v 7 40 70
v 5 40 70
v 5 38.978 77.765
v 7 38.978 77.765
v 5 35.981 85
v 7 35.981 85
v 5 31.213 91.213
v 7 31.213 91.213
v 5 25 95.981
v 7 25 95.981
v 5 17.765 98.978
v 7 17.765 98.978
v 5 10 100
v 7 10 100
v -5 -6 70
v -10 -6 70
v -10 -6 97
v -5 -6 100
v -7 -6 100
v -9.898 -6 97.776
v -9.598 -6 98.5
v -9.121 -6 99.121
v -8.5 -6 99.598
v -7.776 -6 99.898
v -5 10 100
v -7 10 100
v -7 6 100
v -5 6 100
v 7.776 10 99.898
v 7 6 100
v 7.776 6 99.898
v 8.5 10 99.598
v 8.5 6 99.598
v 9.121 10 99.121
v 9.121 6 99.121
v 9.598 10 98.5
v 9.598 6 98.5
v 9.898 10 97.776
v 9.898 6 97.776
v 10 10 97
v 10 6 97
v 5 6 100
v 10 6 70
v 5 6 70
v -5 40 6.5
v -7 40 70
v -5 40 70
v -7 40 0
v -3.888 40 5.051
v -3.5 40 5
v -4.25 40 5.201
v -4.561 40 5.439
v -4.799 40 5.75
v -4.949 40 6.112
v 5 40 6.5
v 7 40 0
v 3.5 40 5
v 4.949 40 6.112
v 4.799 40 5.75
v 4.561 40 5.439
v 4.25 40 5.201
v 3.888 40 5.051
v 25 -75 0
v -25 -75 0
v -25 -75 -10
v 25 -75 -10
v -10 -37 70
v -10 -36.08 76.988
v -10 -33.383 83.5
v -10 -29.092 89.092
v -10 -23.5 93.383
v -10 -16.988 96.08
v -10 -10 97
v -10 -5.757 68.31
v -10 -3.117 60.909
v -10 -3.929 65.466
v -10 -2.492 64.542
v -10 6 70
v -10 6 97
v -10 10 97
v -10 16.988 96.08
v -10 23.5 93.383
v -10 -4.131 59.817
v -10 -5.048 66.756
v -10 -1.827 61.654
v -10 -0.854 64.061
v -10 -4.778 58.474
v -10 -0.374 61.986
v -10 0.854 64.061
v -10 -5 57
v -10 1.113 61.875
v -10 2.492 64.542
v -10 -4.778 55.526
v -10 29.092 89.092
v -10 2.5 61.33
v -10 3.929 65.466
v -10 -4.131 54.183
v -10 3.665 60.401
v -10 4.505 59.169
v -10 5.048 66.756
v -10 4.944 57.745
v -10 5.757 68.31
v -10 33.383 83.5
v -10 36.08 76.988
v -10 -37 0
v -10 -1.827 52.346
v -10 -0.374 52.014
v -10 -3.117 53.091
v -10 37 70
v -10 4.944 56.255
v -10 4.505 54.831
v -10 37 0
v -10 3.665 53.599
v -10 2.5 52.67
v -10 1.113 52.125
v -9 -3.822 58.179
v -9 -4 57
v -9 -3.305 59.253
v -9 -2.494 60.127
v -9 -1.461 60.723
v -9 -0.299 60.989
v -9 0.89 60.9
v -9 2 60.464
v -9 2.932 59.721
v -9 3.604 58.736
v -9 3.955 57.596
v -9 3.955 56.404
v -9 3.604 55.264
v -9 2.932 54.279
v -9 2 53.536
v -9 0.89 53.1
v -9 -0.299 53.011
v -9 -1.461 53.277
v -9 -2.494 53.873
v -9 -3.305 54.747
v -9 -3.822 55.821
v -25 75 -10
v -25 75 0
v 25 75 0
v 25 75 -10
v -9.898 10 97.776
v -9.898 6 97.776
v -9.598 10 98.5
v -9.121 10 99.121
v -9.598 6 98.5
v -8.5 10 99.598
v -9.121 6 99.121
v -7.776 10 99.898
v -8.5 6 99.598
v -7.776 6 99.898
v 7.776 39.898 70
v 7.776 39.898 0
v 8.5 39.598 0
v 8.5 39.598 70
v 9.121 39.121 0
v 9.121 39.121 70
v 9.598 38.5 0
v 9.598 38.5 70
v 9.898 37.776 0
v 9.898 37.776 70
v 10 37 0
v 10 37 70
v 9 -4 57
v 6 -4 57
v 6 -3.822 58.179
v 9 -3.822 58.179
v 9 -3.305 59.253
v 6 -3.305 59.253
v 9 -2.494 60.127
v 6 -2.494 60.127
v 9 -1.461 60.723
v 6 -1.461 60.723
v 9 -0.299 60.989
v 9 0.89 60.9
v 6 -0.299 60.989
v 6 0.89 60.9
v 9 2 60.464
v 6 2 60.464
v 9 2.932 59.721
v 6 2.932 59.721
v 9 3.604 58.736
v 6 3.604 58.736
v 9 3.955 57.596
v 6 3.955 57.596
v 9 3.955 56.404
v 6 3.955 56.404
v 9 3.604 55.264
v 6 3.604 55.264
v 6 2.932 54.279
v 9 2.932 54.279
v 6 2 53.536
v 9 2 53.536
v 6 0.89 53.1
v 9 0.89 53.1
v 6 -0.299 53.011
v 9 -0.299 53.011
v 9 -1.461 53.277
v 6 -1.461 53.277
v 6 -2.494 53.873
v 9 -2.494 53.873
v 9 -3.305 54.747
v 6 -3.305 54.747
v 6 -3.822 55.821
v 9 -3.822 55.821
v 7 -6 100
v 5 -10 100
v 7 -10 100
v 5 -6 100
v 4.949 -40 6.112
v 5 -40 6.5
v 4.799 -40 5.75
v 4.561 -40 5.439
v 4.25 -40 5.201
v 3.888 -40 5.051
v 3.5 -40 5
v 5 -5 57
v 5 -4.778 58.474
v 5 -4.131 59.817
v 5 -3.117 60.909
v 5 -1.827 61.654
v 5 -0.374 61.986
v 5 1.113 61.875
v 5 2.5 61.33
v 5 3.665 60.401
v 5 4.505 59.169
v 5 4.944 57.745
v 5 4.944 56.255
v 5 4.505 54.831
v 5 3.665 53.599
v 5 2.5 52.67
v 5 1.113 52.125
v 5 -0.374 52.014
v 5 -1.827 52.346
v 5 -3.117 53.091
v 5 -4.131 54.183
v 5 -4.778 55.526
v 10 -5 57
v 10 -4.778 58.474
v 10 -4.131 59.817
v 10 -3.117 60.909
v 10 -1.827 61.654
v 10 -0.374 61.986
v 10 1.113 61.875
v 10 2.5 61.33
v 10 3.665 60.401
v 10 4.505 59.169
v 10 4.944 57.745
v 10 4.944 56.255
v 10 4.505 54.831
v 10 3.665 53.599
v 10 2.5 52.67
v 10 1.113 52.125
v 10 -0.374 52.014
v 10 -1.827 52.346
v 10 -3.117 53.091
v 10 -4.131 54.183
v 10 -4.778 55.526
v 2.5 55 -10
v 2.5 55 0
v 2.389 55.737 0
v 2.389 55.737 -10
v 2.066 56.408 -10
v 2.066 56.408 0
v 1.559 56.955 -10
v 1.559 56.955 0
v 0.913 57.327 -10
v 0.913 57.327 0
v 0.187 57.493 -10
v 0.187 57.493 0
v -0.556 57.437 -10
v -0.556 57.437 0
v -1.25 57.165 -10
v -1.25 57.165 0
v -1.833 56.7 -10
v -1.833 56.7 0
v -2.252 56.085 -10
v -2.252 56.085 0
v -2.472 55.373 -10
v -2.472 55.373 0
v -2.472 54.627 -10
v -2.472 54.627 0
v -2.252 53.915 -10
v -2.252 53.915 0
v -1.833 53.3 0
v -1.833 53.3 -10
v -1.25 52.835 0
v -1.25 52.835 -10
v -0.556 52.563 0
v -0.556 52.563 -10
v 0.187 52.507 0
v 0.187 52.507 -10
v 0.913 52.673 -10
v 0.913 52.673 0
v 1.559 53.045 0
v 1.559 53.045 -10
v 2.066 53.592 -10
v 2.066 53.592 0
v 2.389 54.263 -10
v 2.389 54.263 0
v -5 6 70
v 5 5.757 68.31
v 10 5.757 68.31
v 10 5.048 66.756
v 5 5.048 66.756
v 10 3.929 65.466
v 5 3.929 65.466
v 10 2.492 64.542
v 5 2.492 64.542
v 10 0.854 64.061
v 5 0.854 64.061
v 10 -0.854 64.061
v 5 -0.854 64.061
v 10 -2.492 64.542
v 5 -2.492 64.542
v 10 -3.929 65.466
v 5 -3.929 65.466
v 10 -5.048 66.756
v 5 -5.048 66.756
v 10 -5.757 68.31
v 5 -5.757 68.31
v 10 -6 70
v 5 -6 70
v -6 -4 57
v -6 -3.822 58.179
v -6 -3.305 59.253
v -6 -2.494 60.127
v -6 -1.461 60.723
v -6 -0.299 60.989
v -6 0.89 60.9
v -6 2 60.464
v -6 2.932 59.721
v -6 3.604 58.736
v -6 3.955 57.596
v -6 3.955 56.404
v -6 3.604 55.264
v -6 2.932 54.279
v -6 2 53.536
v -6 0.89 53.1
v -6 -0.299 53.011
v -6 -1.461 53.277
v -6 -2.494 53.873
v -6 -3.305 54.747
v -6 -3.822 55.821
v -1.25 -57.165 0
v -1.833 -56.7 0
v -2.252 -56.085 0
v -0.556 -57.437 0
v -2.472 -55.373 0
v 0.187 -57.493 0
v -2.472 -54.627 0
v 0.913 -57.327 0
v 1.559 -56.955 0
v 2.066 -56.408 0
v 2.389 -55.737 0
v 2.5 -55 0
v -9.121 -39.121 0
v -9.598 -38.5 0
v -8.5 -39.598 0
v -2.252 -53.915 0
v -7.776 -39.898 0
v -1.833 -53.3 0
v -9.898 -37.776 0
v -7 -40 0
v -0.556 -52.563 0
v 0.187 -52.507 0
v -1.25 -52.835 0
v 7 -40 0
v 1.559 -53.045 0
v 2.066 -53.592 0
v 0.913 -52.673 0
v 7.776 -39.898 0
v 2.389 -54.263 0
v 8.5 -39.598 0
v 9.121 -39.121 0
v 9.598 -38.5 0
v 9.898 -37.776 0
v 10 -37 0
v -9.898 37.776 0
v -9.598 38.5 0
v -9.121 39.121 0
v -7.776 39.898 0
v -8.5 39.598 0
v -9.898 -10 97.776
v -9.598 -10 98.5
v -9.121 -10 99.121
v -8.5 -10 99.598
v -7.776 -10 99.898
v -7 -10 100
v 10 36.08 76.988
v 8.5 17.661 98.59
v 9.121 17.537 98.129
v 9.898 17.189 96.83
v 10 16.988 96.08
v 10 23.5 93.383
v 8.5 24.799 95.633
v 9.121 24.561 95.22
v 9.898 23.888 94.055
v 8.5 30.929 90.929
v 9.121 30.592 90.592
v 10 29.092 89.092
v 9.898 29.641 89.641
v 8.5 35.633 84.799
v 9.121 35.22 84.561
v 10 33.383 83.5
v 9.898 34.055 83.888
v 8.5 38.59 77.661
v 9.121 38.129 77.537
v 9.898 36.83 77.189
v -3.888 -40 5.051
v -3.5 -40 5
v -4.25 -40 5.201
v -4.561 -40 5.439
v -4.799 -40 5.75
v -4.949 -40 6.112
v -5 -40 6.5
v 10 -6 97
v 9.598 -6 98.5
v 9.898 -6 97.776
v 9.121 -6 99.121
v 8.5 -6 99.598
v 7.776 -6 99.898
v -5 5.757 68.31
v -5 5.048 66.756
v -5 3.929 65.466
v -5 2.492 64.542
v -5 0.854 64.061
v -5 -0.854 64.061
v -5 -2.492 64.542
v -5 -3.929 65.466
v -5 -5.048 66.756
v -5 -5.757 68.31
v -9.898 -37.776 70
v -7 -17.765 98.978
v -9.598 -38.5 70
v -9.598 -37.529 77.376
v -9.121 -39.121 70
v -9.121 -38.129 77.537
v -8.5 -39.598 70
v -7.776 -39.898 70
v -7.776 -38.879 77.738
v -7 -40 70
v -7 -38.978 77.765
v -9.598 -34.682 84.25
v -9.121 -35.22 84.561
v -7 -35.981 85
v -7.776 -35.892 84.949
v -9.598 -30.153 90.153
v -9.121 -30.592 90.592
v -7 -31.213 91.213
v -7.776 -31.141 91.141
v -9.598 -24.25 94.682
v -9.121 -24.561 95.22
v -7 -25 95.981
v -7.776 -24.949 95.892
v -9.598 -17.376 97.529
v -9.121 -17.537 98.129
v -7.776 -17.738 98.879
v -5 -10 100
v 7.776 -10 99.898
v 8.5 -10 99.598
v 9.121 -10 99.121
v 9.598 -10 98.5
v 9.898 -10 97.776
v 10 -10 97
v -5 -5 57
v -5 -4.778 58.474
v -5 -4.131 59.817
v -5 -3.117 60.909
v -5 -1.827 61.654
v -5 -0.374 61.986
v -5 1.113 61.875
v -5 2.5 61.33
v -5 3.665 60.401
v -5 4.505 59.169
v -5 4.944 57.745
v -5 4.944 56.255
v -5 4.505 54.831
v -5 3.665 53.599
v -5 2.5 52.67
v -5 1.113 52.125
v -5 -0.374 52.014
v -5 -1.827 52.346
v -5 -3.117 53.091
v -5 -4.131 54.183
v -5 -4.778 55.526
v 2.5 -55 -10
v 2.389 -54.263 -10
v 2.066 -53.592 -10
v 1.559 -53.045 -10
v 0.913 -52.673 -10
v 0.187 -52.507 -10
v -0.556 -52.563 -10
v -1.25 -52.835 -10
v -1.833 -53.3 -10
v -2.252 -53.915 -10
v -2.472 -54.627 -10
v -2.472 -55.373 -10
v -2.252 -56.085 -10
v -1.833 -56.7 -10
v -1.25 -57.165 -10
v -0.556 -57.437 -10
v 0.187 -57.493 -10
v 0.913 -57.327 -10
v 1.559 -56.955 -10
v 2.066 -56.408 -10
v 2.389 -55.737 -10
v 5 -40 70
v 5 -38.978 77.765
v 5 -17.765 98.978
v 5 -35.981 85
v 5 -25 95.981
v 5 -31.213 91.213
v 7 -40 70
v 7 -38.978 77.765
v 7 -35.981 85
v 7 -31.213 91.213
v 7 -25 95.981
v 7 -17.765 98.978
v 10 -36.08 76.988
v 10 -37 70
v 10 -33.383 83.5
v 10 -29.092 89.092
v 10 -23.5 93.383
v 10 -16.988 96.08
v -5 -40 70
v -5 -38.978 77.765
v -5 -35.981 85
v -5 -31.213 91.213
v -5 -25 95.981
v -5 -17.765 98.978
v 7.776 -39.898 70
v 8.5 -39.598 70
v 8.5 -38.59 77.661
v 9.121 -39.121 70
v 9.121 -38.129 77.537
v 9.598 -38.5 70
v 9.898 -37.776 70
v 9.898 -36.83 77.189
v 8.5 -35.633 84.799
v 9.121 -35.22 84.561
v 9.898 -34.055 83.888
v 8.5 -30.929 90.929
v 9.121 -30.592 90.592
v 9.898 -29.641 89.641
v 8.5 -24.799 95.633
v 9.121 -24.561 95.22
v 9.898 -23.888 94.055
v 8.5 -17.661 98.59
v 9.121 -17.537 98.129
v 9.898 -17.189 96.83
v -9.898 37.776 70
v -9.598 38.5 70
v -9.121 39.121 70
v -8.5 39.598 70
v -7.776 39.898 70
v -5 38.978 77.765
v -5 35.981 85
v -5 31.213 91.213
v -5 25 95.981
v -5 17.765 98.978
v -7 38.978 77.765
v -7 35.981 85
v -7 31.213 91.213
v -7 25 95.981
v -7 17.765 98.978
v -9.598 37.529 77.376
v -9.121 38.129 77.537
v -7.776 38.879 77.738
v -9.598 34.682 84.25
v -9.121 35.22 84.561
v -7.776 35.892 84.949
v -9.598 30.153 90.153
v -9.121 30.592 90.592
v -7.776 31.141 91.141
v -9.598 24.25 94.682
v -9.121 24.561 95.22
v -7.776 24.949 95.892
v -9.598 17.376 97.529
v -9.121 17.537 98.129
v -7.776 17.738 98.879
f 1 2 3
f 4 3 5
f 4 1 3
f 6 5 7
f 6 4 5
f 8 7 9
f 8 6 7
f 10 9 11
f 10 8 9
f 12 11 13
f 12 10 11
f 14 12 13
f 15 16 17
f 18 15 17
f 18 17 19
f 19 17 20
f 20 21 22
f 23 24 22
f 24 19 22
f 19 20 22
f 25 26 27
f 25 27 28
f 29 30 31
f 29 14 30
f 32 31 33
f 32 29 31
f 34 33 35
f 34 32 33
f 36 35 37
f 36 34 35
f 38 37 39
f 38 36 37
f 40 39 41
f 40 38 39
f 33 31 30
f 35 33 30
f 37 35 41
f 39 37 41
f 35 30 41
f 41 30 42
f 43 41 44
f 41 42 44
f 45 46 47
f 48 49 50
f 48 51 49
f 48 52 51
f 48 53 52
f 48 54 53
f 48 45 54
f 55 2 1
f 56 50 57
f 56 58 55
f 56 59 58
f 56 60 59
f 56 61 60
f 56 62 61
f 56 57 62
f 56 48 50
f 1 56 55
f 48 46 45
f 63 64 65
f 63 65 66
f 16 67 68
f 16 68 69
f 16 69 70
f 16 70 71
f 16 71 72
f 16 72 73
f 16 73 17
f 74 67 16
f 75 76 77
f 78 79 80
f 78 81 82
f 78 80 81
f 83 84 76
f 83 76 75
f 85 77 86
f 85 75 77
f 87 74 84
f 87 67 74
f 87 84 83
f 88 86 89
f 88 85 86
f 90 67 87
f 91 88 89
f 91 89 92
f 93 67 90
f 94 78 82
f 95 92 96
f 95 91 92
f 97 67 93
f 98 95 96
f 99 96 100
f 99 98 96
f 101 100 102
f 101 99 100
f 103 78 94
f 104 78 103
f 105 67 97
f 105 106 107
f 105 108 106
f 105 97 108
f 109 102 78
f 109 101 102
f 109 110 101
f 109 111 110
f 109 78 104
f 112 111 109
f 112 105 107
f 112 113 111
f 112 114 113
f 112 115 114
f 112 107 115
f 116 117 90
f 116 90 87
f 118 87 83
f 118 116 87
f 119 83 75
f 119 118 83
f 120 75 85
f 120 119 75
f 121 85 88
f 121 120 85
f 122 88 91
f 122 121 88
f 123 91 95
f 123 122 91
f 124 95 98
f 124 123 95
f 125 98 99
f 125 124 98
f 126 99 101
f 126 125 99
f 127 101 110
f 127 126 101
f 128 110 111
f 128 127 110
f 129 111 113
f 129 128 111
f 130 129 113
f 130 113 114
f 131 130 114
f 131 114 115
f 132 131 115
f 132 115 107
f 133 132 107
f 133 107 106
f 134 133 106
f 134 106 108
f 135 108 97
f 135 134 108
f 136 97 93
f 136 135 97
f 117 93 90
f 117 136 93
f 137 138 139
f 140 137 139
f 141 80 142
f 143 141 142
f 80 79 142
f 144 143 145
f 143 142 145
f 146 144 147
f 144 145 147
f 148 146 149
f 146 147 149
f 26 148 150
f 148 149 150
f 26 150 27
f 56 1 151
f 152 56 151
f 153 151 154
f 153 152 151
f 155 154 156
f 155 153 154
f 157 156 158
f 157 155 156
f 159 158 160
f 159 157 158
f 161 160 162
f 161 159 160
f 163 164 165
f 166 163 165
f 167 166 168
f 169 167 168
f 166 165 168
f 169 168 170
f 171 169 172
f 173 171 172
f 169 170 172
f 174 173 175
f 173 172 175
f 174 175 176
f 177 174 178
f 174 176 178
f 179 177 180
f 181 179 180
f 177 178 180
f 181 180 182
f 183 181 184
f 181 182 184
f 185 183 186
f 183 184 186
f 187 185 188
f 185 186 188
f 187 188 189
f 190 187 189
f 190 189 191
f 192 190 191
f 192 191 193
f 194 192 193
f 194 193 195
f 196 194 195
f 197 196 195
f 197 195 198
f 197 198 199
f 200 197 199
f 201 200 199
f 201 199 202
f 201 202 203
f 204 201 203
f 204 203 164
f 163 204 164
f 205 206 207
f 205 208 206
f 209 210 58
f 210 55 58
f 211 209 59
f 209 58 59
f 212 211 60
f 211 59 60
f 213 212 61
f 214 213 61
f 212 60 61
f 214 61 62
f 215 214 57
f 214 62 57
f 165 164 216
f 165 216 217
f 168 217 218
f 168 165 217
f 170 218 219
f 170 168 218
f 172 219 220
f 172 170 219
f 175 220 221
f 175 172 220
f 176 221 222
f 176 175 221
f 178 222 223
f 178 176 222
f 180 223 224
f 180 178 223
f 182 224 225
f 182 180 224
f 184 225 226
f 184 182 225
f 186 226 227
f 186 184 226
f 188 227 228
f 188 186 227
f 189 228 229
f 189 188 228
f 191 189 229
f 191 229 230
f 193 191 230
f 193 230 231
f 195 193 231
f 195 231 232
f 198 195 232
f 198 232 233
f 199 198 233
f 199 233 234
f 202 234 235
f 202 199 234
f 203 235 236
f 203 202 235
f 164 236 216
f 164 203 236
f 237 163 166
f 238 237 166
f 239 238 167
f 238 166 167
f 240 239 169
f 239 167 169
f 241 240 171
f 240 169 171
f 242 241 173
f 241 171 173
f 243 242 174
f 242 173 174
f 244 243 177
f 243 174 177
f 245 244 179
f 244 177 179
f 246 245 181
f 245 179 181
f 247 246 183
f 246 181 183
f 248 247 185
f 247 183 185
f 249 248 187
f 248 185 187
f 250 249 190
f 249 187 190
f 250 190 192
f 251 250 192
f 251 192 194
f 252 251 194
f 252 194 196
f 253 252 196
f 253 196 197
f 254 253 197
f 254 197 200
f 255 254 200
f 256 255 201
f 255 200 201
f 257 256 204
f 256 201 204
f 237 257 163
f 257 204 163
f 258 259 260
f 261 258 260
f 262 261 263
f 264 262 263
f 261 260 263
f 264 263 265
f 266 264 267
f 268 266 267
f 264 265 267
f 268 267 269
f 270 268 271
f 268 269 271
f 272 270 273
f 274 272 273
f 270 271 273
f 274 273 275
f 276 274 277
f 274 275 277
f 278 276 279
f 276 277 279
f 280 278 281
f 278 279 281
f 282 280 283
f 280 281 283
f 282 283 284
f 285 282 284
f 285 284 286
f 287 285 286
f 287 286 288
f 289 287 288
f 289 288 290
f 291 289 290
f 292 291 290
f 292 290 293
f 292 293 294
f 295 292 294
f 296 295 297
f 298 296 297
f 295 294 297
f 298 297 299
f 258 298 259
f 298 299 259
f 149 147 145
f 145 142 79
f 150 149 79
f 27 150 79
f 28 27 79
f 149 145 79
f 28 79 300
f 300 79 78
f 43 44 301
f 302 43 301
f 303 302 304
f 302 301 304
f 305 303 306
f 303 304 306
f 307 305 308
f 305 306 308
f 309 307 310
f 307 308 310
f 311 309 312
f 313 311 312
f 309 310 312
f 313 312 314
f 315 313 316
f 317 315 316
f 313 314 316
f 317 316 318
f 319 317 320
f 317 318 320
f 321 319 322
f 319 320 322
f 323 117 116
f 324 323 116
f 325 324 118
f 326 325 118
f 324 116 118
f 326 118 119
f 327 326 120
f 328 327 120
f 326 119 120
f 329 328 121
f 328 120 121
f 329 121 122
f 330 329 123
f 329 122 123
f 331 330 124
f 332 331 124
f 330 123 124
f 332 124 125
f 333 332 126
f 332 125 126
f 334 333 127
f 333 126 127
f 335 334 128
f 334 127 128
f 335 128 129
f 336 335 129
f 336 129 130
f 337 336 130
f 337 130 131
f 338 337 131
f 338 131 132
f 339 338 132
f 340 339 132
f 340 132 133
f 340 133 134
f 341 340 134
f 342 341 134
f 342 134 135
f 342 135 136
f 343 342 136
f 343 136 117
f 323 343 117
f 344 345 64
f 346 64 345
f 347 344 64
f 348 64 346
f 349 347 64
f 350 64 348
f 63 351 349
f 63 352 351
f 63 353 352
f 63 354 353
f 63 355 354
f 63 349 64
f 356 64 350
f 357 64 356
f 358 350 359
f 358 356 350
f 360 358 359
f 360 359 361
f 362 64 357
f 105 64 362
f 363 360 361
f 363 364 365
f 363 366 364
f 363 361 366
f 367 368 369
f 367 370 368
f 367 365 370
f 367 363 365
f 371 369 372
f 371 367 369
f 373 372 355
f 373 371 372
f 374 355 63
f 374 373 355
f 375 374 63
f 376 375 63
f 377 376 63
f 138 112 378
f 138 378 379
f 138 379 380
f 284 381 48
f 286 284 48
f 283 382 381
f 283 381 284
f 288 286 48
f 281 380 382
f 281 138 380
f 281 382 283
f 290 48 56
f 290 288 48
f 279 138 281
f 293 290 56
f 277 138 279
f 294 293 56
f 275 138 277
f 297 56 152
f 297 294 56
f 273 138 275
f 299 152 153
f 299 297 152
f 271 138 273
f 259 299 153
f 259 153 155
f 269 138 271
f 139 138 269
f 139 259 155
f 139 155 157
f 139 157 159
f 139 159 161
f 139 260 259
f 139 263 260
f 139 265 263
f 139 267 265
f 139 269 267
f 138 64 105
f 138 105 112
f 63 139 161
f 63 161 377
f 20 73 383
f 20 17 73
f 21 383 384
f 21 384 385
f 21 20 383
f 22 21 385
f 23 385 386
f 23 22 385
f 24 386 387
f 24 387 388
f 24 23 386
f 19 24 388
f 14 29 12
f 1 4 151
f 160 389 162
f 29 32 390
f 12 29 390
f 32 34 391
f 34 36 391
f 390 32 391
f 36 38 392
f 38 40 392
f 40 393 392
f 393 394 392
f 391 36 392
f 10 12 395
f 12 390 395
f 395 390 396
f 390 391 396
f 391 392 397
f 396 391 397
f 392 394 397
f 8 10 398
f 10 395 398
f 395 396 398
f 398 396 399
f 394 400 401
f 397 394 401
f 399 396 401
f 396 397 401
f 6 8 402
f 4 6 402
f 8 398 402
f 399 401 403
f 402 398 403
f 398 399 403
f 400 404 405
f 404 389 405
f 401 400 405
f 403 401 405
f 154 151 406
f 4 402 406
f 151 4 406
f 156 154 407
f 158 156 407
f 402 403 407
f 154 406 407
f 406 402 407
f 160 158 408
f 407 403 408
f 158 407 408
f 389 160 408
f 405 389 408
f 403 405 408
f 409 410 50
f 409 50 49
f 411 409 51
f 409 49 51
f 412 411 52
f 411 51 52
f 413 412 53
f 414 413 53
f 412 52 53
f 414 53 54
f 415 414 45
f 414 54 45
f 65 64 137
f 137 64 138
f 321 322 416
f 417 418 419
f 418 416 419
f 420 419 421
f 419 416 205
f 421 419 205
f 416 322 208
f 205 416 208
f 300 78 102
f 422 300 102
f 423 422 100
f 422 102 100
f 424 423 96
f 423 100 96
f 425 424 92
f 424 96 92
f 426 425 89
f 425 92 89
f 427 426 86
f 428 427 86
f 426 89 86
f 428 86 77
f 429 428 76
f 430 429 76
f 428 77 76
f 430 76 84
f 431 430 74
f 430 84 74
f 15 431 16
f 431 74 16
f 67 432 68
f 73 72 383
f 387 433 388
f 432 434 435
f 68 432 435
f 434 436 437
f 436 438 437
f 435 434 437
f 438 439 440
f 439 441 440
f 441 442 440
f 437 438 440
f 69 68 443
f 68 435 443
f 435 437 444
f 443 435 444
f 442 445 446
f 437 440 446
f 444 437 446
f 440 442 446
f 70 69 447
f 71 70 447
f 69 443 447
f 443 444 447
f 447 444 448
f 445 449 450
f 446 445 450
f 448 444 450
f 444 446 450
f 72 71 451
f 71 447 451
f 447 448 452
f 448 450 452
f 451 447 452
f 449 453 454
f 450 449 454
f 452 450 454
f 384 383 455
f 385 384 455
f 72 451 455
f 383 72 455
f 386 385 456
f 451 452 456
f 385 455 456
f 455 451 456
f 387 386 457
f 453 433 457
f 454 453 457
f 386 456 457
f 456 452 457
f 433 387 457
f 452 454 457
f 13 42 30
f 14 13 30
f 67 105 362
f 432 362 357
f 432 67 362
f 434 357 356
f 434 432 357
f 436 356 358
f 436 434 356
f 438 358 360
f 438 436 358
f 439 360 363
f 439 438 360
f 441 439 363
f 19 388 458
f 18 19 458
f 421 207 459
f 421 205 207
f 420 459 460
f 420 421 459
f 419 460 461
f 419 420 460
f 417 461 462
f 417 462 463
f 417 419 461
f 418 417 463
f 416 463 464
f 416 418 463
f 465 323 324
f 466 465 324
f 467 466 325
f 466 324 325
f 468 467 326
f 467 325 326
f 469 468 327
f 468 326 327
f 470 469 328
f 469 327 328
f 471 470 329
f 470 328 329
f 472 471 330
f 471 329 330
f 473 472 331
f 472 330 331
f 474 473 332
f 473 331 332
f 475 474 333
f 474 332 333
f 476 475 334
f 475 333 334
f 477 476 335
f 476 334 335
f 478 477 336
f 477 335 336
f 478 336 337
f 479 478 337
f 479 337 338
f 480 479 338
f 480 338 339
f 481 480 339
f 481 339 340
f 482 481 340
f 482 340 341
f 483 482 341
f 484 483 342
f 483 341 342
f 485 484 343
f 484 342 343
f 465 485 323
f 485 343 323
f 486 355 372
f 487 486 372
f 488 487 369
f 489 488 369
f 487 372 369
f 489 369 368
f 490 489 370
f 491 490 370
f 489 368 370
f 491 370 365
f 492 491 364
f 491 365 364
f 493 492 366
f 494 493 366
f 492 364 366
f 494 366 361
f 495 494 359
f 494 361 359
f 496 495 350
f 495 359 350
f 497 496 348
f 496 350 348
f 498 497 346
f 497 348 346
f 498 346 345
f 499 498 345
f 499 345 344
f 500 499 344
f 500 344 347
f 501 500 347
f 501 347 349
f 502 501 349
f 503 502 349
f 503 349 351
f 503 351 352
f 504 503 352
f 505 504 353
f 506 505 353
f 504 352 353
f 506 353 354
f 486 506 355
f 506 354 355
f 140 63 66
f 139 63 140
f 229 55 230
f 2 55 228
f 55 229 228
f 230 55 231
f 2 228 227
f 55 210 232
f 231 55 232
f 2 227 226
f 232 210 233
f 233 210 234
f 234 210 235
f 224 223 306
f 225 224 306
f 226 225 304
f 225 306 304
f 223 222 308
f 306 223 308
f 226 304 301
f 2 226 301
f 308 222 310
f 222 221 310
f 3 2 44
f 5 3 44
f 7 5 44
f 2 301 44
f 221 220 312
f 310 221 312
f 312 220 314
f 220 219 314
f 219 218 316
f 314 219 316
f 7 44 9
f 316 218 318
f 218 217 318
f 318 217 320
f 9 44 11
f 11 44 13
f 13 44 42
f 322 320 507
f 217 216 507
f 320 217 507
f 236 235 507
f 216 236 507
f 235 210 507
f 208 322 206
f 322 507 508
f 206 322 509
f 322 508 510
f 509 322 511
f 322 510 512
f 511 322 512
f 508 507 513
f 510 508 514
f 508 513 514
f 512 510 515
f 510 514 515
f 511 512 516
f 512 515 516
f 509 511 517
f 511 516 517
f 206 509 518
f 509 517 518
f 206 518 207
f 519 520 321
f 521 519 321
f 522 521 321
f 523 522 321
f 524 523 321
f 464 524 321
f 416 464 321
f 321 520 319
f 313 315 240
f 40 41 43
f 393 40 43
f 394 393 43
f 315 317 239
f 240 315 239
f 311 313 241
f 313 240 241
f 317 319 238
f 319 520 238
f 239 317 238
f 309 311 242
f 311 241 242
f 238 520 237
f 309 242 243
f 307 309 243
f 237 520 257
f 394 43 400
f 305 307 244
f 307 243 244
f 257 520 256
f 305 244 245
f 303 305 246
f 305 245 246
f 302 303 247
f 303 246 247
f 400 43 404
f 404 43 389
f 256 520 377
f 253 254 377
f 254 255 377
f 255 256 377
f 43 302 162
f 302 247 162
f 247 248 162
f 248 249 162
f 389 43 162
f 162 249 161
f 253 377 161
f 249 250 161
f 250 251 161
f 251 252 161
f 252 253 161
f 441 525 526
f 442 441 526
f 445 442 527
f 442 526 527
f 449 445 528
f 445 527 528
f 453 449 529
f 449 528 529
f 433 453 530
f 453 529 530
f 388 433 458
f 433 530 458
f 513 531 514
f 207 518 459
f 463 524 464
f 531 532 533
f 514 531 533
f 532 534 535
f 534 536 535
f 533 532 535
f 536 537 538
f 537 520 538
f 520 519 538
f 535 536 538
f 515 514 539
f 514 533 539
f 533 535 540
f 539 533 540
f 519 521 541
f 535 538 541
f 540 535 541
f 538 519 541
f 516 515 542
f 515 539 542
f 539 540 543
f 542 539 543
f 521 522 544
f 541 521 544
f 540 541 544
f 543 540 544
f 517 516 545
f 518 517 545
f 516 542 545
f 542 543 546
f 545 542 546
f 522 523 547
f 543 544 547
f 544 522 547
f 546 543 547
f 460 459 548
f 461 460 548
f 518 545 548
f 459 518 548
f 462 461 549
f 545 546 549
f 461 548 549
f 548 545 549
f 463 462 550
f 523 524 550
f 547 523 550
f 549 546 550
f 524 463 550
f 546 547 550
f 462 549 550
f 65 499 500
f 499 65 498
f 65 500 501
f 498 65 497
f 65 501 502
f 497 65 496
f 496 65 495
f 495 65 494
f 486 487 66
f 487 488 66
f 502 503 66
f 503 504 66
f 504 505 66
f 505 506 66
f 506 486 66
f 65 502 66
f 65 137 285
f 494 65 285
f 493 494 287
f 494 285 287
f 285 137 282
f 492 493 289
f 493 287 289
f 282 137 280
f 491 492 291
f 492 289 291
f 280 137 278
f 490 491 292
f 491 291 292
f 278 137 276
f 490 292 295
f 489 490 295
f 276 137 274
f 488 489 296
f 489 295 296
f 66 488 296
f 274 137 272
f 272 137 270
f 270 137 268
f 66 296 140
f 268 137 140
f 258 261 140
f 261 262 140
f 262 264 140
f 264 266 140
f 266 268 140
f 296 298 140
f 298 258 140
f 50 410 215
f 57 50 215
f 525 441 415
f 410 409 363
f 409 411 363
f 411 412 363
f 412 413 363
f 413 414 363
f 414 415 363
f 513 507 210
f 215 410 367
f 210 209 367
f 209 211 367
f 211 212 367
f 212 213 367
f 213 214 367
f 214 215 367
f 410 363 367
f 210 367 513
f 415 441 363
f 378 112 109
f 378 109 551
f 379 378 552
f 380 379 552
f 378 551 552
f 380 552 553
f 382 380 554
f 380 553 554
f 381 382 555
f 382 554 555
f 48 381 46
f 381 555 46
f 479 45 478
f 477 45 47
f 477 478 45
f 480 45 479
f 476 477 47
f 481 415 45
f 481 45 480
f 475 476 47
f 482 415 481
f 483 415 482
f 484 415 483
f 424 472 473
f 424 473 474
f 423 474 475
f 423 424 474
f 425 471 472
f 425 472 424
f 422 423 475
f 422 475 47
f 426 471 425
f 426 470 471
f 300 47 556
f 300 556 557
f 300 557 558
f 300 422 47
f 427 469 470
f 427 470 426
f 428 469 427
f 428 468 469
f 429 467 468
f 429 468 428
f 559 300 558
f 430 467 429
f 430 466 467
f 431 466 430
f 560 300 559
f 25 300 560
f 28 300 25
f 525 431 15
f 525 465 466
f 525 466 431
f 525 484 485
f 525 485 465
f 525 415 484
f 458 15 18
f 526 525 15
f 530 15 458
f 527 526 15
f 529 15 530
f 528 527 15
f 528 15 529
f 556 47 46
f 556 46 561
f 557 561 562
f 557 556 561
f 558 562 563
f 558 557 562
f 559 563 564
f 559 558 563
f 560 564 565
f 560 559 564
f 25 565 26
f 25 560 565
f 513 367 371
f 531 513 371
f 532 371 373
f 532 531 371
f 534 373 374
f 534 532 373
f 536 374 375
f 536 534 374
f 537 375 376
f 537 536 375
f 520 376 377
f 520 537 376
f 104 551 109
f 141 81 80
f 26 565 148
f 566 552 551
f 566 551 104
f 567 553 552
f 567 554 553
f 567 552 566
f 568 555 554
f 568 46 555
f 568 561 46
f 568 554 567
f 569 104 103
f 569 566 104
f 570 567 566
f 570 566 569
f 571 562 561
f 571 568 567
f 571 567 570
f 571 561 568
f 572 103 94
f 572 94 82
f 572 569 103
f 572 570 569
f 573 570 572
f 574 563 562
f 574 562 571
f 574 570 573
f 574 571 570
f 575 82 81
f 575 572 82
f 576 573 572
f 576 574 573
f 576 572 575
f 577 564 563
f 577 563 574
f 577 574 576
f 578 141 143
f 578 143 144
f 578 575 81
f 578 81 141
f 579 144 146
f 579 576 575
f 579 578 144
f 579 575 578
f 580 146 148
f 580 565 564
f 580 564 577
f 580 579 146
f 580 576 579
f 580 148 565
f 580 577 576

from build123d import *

# Parameters (mm, degrees)
F0_W     = 50
F0_H     = 150
F0_R     = 2.5
F0_W_2   = 20
F0_H_2   = 80
F1_DEPTH = 10
F2_DEPTH = 100
F4_DEPTH = 20
F5_W     = 10
F5_H     = 95
F6_DEPTH = 115.001
F7_R     = 1.5
F8_R     = 4
F9_DEPTH = 35.001
F10_SIZE = 1
F11_R    = 30
F12_R    = 3


with BuildPart() as f1:
    # F0 (on Top) → F1 (new body)
    with BuildSketch(Plane.XY):
        Rectangle(F0_W, F0_H)
        with Locations((0, -55)):
            Circle(F0_R, mode=Mode.SUBTRACT)
        Rectangle(F0_W_2, F0_H_2, mode=Mode.SUBTRACT)
        with Locations((0, 55)):
            Circle(F0_R, mode=Mode.SUBTRACT)
        Rectangle(F0_W_2, F0_H_2)
    extrude(amount=-F1_DEPTH)

    # F0 (on Top) → F2 (join)
    with BuildSketch(Plane.XY):
        Rectangle(F0_W_2, F0_H_2)
    extrude(amount=F2_DEPTH)

    # F3 (on face) → F4 (cut, through all)
    with BuildSketch(Plane(origin=(-10, 0, 0), x_dir=(0, -1, 0), z_dir=(-1, 0, 0))):
        with BuildLine():
            Line((-6, 100), (-6, 70))
            ThreePointArc((-6, 70), (0, 64), (6, 70))
            Line((6, 70), (6, 100))
            Line((6, 100), (-6, 100))
        make_face()
    extrude(amount=-F4_DEPTH, mode=Mode.SUBTRACT)

    # F5 (on face) → F6 (cut, through all)
    with BuildSketch(Plane.XZ.offset(40)):
        with Locations((0, 52.5)):
            Rectangle(F5_W, F5_H)
    extrude(amount=-F6_DEPTH, mode=Mode.SUBTRACT)

    # F7
    f7_edges = [f1.edges().sort_by_distance(p)[0] for p in [
        (5, 0, 5),
        (-5, 0, 5),
    ]]
    fillet(f7_edges, radius=F7_R)

    # F8 (on face) → F9 (cut, through all)
    with BuildSketch(Plane(origin=(-10, 0, 0), x_dir=(0, -1, 0), z_dir=(-1, 0, 0))):
        with Locations((0, 57)):
            Circle(F8_R)
    extrude(amount=-F9_DEPTH, mode=Mode.SUBTRACT)

    # F10
    f10_edges = [f1.edges().sort_by_distance(p)[0] for p in [
        (-10, 4, 57),
        (-5, 4, 57),
        (5, 4, 57),
        (10, 4, 57),
    ]]
    chamfer(f10_edges, length=F10_SIZE)

    # F11
    f11_edges = [f1.edges().sort_by_distance(p)[0] for p in [
        (-7.5, 40, 100),
        (7.5, 40, 100),
        (7.5, -40, 100),
        (-7.5, -40, 100),
    ]]
    fillet(f11_edges, radius=F11_R)

    # F12
    f12_edges = [f1.edges().sort_by_distance(p)[0] for p in [
        (-10, 31.213203, 91.213203),
        (-10, 8, 100),
        (-10, -8, 100),
        (-10, -31.213203, 91.213203),
        (10, -31.213203, 91.213203),
        (10, -8, 100),
        (10, 8, 100),
        (10, 31.213203, 91.213203),
    ]]
    fillet(f12_edges, radius=F12_R)


solid = f1.part
